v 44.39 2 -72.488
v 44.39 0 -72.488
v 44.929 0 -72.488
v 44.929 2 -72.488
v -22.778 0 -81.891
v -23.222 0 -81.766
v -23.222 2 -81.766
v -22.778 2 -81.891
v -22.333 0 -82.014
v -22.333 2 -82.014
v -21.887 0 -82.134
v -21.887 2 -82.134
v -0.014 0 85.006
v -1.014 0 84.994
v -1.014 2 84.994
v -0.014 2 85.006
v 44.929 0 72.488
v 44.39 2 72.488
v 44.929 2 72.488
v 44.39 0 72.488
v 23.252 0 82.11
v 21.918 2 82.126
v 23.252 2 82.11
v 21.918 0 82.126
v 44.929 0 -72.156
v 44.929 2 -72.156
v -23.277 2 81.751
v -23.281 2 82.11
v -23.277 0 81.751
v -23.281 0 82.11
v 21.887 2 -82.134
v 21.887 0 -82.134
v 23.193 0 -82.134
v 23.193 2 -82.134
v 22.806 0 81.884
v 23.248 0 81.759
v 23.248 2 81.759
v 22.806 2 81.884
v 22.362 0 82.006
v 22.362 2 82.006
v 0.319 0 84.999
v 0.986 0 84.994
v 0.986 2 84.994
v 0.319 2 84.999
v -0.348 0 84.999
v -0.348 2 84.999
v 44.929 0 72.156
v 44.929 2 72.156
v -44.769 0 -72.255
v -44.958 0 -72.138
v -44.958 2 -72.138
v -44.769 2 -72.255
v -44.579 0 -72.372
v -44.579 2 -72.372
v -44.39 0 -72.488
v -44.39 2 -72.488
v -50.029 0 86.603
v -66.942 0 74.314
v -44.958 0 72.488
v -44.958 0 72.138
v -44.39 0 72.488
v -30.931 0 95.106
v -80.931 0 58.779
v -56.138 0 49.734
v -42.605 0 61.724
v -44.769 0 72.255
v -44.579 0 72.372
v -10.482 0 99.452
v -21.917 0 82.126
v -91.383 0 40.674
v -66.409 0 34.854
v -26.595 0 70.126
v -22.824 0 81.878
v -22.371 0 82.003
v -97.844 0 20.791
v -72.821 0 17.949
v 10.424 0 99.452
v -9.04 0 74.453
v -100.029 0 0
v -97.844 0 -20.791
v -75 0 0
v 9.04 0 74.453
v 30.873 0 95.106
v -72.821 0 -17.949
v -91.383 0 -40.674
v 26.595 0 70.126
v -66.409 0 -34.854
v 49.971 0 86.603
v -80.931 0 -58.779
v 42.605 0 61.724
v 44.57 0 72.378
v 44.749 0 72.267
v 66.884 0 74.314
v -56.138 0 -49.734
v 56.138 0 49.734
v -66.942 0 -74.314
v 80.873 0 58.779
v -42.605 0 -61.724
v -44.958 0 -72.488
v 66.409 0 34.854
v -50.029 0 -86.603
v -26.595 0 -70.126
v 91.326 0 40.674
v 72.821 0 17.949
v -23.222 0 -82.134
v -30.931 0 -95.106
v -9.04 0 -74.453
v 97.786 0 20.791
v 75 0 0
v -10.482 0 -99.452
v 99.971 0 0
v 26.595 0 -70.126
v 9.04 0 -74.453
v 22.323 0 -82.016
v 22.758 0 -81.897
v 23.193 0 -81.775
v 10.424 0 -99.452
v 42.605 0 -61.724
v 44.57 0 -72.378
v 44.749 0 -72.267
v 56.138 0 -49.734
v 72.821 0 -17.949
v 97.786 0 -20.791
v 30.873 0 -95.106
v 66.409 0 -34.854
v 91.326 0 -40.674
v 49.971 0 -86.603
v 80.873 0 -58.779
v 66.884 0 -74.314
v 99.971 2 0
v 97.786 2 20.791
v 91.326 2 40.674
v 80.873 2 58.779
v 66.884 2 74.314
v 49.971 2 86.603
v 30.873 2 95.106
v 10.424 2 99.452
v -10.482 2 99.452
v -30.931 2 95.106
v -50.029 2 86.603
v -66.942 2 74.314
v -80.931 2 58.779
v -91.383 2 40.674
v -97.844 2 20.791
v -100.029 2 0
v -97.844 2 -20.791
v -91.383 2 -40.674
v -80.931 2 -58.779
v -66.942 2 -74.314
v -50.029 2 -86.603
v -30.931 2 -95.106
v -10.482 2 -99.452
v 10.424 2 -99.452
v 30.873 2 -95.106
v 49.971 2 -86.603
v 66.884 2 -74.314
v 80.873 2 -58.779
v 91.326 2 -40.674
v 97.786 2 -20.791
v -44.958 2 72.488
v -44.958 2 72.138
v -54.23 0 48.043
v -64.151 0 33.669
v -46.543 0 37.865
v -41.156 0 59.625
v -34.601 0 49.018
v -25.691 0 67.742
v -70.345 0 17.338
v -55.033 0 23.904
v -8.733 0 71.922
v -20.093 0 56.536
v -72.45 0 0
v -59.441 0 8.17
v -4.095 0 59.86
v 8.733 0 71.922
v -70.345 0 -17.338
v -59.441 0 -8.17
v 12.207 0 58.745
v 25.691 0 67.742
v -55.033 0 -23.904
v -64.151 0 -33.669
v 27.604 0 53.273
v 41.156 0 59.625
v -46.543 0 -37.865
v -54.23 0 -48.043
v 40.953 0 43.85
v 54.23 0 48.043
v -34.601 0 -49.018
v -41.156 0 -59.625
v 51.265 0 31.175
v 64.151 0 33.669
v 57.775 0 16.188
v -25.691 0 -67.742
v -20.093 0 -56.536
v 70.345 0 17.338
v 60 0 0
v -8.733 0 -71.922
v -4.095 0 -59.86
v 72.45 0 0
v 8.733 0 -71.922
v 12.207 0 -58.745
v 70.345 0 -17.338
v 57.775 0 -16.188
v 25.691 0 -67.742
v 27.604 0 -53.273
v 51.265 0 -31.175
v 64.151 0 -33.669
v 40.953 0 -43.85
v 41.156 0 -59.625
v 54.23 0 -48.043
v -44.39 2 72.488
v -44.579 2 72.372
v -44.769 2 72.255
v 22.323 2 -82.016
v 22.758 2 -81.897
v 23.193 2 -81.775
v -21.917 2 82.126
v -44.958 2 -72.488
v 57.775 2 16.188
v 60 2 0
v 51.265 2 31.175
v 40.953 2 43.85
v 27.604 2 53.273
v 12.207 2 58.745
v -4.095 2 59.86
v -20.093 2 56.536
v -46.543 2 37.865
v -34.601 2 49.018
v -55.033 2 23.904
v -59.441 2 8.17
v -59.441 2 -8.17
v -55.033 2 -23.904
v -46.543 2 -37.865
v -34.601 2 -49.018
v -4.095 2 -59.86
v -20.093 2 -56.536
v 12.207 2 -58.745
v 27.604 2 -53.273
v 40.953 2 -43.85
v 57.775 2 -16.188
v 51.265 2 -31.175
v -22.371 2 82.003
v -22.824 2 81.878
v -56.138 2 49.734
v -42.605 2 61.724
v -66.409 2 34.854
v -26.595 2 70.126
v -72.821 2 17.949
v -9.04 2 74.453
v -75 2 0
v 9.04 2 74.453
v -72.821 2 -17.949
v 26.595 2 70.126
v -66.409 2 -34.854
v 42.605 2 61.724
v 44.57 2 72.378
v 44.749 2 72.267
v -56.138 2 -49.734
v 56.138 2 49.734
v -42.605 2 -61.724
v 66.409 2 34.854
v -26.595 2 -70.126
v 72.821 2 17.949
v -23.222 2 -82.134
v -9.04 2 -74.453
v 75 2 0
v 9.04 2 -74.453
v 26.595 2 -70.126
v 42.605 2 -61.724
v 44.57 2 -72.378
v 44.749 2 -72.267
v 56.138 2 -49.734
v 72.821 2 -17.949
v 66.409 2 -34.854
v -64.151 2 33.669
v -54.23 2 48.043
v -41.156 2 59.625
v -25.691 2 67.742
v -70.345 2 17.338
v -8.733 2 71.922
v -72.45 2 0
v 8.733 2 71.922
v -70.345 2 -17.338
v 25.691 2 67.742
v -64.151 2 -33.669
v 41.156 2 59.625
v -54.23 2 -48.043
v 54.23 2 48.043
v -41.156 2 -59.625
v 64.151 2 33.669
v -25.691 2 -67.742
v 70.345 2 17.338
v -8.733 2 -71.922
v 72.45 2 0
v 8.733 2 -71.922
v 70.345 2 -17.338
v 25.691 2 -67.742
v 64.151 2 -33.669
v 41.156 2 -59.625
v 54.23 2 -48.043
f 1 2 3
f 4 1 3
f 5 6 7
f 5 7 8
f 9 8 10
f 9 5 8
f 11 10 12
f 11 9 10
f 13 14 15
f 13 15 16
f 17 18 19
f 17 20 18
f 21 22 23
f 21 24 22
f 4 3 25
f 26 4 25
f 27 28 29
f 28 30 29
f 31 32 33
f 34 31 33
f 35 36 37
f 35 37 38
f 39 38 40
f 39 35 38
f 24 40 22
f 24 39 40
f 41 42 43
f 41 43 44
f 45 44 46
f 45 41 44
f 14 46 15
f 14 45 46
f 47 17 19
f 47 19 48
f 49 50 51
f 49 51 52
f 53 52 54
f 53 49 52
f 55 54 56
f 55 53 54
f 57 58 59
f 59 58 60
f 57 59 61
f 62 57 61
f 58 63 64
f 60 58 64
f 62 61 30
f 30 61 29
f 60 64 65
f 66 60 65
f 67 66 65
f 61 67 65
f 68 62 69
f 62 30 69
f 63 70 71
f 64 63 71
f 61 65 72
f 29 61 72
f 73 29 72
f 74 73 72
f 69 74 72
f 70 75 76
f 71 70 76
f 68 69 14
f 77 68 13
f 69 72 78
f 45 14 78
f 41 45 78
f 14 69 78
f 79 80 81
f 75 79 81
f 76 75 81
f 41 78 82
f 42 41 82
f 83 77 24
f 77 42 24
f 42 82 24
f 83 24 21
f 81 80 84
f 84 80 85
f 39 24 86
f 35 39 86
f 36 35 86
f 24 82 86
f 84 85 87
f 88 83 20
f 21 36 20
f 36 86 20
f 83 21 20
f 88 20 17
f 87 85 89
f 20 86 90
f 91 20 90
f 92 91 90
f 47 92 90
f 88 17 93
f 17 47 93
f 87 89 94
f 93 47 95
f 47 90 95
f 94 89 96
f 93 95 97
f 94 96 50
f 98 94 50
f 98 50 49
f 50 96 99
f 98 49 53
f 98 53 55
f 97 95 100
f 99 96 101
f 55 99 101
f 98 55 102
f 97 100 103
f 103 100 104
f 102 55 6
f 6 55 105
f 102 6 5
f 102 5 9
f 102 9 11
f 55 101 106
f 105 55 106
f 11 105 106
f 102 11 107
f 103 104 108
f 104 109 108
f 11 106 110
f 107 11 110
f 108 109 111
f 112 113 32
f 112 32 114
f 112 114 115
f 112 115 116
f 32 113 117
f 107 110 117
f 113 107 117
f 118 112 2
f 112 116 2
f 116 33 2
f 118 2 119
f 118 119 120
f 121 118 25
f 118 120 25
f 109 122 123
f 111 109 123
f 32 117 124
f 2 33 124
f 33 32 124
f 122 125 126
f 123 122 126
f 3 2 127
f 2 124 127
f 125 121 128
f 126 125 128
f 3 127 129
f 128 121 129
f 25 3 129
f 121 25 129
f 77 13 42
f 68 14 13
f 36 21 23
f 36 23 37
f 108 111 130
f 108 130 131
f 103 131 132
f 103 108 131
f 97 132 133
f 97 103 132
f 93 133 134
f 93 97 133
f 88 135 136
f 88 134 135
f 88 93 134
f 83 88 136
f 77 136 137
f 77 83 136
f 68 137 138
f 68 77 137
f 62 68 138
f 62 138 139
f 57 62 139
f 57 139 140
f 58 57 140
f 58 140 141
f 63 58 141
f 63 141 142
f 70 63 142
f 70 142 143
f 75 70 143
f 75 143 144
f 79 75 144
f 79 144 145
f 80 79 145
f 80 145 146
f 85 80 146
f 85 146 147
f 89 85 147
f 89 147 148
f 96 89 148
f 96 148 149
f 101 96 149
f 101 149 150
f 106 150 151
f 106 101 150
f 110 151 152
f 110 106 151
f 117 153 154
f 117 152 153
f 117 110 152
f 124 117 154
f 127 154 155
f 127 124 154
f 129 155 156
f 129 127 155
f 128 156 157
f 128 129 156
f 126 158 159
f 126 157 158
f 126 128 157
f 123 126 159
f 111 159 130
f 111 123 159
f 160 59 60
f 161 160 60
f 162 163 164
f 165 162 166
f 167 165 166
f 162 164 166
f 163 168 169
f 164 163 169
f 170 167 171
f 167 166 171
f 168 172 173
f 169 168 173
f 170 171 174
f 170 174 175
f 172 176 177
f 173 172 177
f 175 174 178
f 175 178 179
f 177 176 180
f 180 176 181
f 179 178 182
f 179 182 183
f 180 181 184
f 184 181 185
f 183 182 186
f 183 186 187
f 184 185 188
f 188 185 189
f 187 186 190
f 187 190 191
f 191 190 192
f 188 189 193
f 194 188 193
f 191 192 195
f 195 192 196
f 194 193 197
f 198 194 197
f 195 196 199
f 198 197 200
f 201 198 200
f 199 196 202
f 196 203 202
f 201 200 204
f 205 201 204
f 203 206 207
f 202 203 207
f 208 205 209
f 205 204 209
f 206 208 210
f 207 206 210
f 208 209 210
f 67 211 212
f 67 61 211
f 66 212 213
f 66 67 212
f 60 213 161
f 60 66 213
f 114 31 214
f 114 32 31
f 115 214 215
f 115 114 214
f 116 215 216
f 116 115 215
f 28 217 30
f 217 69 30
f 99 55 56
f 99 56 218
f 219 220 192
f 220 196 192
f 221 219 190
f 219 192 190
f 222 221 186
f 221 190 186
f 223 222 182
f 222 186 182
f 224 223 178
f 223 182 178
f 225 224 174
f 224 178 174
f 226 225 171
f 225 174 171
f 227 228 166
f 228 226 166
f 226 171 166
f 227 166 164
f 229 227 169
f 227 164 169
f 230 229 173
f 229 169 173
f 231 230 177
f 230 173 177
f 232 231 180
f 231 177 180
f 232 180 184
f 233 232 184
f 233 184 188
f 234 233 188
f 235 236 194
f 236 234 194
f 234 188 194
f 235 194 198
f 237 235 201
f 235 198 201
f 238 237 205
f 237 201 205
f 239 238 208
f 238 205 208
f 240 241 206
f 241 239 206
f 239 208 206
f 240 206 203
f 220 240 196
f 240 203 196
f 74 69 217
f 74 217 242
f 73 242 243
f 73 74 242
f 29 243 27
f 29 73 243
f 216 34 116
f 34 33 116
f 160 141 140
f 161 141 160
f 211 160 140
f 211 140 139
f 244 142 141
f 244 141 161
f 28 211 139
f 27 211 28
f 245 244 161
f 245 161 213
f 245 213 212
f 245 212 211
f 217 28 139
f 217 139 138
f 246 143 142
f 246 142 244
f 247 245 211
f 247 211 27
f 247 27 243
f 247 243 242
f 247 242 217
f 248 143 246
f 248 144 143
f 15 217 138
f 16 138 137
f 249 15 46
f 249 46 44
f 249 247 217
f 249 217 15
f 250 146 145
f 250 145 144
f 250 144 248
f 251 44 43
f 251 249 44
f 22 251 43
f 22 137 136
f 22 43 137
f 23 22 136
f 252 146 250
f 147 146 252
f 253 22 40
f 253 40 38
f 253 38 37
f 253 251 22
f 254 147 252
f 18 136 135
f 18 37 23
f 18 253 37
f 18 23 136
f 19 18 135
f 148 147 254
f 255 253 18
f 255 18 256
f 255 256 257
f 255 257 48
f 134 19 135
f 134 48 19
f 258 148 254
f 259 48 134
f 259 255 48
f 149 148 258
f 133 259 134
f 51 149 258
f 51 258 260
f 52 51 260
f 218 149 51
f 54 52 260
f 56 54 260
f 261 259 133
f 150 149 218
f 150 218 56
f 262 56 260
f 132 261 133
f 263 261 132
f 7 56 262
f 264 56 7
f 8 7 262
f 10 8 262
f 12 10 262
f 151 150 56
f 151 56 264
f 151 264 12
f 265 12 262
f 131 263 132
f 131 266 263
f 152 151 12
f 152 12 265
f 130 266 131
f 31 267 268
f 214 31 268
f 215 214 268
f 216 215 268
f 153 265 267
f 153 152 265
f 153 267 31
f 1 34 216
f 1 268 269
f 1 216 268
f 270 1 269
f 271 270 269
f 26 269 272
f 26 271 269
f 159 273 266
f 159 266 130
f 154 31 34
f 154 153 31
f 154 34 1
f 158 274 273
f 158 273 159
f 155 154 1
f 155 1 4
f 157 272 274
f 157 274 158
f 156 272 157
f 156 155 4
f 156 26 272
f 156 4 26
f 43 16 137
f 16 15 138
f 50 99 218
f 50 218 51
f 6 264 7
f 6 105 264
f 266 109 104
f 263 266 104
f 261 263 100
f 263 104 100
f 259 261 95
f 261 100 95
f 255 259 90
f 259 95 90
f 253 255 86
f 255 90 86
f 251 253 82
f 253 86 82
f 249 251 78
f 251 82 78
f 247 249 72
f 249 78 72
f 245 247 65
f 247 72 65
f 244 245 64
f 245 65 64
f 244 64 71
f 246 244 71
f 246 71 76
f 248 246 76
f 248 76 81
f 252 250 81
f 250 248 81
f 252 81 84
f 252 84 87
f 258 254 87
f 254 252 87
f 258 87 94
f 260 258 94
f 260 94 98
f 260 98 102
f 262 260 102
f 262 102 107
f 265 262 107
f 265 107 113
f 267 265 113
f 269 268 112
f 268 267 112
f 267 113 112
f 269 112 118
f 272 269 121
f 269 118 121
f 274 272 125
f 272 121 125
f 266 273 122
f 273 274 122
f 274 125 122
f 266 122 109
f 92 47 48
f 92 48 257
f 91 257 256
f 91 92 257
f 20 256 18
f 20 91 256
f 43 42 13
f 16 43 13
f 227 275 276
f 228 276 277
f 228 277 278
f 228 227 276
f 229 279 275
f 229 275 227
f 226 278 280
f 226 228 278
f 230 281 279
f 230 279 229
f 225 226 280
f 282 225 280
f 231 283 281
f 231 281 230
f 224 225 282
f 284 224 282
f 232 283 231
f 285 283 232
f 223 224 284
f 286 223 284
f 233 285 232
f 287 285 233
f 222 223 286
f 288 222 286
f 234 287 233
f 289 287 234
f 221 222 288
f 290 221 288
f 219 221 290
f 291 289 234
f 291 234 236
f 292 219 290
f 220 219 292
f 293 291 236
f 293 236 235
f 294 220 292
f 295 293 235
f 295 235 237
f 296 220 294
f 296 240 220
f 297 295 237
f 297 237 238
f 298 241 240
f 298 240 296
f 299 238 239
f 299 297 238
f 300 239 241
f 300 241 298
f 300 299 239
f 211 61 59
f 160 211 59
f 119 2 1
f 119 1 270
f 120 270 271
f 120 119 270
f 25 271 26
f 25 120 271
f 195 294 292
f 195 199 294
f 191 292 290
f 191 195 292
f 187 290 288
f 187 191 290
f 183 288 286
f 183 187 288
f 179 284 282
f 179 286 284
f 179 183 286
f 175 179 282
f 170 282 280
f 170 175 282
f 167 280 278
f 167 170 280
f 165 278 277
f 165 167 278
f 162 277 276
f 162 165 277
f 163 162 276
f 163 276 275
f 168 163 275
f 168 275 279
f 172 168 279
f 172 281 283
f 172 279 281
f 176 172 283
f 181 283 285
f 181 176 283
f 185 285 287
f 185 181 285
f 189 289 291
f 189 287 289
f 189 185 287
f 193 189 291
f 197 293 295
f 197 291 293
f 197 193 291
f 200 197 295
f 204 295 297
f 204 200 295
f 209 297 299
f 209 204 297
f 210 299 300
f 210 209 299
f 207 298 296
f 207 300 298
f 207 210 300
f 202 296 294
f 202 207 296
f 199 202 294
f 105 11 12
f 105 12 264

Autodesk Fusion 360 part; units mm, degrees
sketch "Sketch1" plane through (0, 0, 0) normal (0, 1, 0) x (1, 0, 0)
sketch "Sketch2" plane through (0, 0, 0) normal (0, 1, 0) x (1, 0, 0)
  circle A0 centre (0, 0) radius 60
  circle A1 centre (0, 0) radius 72.45
  dimension "d18" = 120
  dimension "d19" = 144.9
extrude "Extrude3" add sketch "Sketch2" along normal blind 2

Autodesk Fusion 360 part; units mm, degrees
sketch "Sketch1" plane through (0, 0, 0) normal (0, 1, 0) x (1, 0, 0)
  line L0 (-0.9547, -79.9943) -> (-1.0144, -84.9943)
  line L1 (-1.0144, -84.9943) -> (0.9855, -85.0182)
  line L2 (-21.2219, -77.1338) -> (-21.2816, -82.1335)
  line L3 (-21.2816, -82.1335) -> (-23.2814, -82.1096)
  line L4 (-23.2814, -82.1096) -> (-23.2152, -76.5575)
  line L5 (-42.9575, -67.4881) -> (-42.9575, -72.4881)
  line L6 (-42.9575, -72.4881) -> (-44.9575, -72.4881)
  line L7 (-44.9575, -72.4881) -> (-44.9575, -66.1727)
  arc A0 (-42.9575, -67.4881) -> (-23.2152, -76.5575) centre (0, 0) ccw
  arc A1 (-21.2219, -77.1338) -> (-0.9547, -79.9943) centre (0, 0) ccw
  line L8 (-0.9547, 79.9943) -> (-0.9547, 84.9943)
  line L9 (-0.9547, 84.9943) -> (-0.0144, 84.9943)
  line L10 (-21.2219, 77.1338) -> (-21.2219, 82.1338)
  line L11 (-21.2219, 82.1338) -> (-23.2219, 82.1338)
  line L12 (-23.2219, 82.1338) -> (-23.2219, 76.5555)
  line L13 (-42.9575, 67.4881) -> (-42.9575, 72.4881)
  line L14 (-42.9575, 72.4881) -> (-44.9575, 72.4881)
  line L15 (-44.9575, 72.4881) -> (-44.9575, 66.1727)
  arc A2 (-44.9575, 66.1727) -> (-44.9575, -66.1727) centre (0, 0) ccw
  arc A3 (-23.2219, 76.5555) -> (-42.9575, 67.4881) centre (0, 0) ccw
  arc A4 (-0.9547, 79.9943) -> (-21.2219, 77.1338) centre (0, 0) ccw
  line L16 (42.9286, 72.4881) -> (44.9286, 72.4881)
  line L17 (21.2527, -82.1335) -> (23.2525, -82.1096)
  arc A5 (21.193, 77.1338) -> (0.9258, 79.9943) centre (-0.0289, 0) ccw
  line L18 (0.9258, -79.9943) -> (0.9855, -84.9943)
  line L19 (23.2525, -82.1096) -> (23.1863, -76.5575)
  arc A6 (0.9258, -79.9943) -> (21.193, -77.1338) centre (-0.0289, 0) ccw
  line L20 (21.193, -77.1338) -> (21.2527, -82.1335)
  arc A7 (44.9286, -66.1727) -> (44.9286, 66.1727) centre (-0.0289, 0) ccw
  line L21 (42.9286, 67.4881) -> (42.9286, 72.4881)
  line L22 (21.193, 77.1338) -> (21.193, 82.1338)
  line L23 (21.193, 82.1338) -> (23.193, 82.1338)
  line L24 (42.9286, -72.4881) -> (44.9286, -72.4881)
  line L25 (44.9286, -72.4881) -> (44.9286, -66.1727)
  arc A8 (23.1863, -76.5575) -> (42.9286, -67.4881) centre (-0.0289, 0) ccw
  line L26 (23.193, 82.1338) -> (23.193, 76.5555)
  line L27 (42.9286, -67.4881) -> (42.9286, -72.4881)
  line L28 (0.9258, 84.9943) -> (-0.0144, 84.9943)
  line L29 (0.9258, 79.9943) -> (0.9258, 84.9943)
  line L30 (44.9286, 72.4881) -> (44.9286, 66.1727)
  arc A9 (42.9286, 67.4881) -> (23.193, 76.5555) centre (-0.0289, 0) ccw
  line L31 (0.9855, -84.9943) -> (-1.0144, -85.0182)
  circle A10 centre (-0.0289, 0) radius 100
  point P0 (-0.0289, 0)
  dimension "d2" = 2
  dimension "d3" = 5
  dimension "d6" = 2
  dimension "d20" = 200
extrude "Extrude3" add sketch "Sketch1" along normal blind 2
extrude "Extrude2" [suppressed]

Autodesk Fusion 360 part; units mm, degrees
sketch "Sketch3" plane through (0, 0, 0) normal (0, 1, 0) x (1, 0, 0)
  circle A0 centre (0, 0) radius 85
  circle A1 centre (0, 0) radius 75
  dimension "d10" = 170
  dimension "d11" = 150
extrude "Extrude3" add sketch "Sketch3" along normal blind 2
